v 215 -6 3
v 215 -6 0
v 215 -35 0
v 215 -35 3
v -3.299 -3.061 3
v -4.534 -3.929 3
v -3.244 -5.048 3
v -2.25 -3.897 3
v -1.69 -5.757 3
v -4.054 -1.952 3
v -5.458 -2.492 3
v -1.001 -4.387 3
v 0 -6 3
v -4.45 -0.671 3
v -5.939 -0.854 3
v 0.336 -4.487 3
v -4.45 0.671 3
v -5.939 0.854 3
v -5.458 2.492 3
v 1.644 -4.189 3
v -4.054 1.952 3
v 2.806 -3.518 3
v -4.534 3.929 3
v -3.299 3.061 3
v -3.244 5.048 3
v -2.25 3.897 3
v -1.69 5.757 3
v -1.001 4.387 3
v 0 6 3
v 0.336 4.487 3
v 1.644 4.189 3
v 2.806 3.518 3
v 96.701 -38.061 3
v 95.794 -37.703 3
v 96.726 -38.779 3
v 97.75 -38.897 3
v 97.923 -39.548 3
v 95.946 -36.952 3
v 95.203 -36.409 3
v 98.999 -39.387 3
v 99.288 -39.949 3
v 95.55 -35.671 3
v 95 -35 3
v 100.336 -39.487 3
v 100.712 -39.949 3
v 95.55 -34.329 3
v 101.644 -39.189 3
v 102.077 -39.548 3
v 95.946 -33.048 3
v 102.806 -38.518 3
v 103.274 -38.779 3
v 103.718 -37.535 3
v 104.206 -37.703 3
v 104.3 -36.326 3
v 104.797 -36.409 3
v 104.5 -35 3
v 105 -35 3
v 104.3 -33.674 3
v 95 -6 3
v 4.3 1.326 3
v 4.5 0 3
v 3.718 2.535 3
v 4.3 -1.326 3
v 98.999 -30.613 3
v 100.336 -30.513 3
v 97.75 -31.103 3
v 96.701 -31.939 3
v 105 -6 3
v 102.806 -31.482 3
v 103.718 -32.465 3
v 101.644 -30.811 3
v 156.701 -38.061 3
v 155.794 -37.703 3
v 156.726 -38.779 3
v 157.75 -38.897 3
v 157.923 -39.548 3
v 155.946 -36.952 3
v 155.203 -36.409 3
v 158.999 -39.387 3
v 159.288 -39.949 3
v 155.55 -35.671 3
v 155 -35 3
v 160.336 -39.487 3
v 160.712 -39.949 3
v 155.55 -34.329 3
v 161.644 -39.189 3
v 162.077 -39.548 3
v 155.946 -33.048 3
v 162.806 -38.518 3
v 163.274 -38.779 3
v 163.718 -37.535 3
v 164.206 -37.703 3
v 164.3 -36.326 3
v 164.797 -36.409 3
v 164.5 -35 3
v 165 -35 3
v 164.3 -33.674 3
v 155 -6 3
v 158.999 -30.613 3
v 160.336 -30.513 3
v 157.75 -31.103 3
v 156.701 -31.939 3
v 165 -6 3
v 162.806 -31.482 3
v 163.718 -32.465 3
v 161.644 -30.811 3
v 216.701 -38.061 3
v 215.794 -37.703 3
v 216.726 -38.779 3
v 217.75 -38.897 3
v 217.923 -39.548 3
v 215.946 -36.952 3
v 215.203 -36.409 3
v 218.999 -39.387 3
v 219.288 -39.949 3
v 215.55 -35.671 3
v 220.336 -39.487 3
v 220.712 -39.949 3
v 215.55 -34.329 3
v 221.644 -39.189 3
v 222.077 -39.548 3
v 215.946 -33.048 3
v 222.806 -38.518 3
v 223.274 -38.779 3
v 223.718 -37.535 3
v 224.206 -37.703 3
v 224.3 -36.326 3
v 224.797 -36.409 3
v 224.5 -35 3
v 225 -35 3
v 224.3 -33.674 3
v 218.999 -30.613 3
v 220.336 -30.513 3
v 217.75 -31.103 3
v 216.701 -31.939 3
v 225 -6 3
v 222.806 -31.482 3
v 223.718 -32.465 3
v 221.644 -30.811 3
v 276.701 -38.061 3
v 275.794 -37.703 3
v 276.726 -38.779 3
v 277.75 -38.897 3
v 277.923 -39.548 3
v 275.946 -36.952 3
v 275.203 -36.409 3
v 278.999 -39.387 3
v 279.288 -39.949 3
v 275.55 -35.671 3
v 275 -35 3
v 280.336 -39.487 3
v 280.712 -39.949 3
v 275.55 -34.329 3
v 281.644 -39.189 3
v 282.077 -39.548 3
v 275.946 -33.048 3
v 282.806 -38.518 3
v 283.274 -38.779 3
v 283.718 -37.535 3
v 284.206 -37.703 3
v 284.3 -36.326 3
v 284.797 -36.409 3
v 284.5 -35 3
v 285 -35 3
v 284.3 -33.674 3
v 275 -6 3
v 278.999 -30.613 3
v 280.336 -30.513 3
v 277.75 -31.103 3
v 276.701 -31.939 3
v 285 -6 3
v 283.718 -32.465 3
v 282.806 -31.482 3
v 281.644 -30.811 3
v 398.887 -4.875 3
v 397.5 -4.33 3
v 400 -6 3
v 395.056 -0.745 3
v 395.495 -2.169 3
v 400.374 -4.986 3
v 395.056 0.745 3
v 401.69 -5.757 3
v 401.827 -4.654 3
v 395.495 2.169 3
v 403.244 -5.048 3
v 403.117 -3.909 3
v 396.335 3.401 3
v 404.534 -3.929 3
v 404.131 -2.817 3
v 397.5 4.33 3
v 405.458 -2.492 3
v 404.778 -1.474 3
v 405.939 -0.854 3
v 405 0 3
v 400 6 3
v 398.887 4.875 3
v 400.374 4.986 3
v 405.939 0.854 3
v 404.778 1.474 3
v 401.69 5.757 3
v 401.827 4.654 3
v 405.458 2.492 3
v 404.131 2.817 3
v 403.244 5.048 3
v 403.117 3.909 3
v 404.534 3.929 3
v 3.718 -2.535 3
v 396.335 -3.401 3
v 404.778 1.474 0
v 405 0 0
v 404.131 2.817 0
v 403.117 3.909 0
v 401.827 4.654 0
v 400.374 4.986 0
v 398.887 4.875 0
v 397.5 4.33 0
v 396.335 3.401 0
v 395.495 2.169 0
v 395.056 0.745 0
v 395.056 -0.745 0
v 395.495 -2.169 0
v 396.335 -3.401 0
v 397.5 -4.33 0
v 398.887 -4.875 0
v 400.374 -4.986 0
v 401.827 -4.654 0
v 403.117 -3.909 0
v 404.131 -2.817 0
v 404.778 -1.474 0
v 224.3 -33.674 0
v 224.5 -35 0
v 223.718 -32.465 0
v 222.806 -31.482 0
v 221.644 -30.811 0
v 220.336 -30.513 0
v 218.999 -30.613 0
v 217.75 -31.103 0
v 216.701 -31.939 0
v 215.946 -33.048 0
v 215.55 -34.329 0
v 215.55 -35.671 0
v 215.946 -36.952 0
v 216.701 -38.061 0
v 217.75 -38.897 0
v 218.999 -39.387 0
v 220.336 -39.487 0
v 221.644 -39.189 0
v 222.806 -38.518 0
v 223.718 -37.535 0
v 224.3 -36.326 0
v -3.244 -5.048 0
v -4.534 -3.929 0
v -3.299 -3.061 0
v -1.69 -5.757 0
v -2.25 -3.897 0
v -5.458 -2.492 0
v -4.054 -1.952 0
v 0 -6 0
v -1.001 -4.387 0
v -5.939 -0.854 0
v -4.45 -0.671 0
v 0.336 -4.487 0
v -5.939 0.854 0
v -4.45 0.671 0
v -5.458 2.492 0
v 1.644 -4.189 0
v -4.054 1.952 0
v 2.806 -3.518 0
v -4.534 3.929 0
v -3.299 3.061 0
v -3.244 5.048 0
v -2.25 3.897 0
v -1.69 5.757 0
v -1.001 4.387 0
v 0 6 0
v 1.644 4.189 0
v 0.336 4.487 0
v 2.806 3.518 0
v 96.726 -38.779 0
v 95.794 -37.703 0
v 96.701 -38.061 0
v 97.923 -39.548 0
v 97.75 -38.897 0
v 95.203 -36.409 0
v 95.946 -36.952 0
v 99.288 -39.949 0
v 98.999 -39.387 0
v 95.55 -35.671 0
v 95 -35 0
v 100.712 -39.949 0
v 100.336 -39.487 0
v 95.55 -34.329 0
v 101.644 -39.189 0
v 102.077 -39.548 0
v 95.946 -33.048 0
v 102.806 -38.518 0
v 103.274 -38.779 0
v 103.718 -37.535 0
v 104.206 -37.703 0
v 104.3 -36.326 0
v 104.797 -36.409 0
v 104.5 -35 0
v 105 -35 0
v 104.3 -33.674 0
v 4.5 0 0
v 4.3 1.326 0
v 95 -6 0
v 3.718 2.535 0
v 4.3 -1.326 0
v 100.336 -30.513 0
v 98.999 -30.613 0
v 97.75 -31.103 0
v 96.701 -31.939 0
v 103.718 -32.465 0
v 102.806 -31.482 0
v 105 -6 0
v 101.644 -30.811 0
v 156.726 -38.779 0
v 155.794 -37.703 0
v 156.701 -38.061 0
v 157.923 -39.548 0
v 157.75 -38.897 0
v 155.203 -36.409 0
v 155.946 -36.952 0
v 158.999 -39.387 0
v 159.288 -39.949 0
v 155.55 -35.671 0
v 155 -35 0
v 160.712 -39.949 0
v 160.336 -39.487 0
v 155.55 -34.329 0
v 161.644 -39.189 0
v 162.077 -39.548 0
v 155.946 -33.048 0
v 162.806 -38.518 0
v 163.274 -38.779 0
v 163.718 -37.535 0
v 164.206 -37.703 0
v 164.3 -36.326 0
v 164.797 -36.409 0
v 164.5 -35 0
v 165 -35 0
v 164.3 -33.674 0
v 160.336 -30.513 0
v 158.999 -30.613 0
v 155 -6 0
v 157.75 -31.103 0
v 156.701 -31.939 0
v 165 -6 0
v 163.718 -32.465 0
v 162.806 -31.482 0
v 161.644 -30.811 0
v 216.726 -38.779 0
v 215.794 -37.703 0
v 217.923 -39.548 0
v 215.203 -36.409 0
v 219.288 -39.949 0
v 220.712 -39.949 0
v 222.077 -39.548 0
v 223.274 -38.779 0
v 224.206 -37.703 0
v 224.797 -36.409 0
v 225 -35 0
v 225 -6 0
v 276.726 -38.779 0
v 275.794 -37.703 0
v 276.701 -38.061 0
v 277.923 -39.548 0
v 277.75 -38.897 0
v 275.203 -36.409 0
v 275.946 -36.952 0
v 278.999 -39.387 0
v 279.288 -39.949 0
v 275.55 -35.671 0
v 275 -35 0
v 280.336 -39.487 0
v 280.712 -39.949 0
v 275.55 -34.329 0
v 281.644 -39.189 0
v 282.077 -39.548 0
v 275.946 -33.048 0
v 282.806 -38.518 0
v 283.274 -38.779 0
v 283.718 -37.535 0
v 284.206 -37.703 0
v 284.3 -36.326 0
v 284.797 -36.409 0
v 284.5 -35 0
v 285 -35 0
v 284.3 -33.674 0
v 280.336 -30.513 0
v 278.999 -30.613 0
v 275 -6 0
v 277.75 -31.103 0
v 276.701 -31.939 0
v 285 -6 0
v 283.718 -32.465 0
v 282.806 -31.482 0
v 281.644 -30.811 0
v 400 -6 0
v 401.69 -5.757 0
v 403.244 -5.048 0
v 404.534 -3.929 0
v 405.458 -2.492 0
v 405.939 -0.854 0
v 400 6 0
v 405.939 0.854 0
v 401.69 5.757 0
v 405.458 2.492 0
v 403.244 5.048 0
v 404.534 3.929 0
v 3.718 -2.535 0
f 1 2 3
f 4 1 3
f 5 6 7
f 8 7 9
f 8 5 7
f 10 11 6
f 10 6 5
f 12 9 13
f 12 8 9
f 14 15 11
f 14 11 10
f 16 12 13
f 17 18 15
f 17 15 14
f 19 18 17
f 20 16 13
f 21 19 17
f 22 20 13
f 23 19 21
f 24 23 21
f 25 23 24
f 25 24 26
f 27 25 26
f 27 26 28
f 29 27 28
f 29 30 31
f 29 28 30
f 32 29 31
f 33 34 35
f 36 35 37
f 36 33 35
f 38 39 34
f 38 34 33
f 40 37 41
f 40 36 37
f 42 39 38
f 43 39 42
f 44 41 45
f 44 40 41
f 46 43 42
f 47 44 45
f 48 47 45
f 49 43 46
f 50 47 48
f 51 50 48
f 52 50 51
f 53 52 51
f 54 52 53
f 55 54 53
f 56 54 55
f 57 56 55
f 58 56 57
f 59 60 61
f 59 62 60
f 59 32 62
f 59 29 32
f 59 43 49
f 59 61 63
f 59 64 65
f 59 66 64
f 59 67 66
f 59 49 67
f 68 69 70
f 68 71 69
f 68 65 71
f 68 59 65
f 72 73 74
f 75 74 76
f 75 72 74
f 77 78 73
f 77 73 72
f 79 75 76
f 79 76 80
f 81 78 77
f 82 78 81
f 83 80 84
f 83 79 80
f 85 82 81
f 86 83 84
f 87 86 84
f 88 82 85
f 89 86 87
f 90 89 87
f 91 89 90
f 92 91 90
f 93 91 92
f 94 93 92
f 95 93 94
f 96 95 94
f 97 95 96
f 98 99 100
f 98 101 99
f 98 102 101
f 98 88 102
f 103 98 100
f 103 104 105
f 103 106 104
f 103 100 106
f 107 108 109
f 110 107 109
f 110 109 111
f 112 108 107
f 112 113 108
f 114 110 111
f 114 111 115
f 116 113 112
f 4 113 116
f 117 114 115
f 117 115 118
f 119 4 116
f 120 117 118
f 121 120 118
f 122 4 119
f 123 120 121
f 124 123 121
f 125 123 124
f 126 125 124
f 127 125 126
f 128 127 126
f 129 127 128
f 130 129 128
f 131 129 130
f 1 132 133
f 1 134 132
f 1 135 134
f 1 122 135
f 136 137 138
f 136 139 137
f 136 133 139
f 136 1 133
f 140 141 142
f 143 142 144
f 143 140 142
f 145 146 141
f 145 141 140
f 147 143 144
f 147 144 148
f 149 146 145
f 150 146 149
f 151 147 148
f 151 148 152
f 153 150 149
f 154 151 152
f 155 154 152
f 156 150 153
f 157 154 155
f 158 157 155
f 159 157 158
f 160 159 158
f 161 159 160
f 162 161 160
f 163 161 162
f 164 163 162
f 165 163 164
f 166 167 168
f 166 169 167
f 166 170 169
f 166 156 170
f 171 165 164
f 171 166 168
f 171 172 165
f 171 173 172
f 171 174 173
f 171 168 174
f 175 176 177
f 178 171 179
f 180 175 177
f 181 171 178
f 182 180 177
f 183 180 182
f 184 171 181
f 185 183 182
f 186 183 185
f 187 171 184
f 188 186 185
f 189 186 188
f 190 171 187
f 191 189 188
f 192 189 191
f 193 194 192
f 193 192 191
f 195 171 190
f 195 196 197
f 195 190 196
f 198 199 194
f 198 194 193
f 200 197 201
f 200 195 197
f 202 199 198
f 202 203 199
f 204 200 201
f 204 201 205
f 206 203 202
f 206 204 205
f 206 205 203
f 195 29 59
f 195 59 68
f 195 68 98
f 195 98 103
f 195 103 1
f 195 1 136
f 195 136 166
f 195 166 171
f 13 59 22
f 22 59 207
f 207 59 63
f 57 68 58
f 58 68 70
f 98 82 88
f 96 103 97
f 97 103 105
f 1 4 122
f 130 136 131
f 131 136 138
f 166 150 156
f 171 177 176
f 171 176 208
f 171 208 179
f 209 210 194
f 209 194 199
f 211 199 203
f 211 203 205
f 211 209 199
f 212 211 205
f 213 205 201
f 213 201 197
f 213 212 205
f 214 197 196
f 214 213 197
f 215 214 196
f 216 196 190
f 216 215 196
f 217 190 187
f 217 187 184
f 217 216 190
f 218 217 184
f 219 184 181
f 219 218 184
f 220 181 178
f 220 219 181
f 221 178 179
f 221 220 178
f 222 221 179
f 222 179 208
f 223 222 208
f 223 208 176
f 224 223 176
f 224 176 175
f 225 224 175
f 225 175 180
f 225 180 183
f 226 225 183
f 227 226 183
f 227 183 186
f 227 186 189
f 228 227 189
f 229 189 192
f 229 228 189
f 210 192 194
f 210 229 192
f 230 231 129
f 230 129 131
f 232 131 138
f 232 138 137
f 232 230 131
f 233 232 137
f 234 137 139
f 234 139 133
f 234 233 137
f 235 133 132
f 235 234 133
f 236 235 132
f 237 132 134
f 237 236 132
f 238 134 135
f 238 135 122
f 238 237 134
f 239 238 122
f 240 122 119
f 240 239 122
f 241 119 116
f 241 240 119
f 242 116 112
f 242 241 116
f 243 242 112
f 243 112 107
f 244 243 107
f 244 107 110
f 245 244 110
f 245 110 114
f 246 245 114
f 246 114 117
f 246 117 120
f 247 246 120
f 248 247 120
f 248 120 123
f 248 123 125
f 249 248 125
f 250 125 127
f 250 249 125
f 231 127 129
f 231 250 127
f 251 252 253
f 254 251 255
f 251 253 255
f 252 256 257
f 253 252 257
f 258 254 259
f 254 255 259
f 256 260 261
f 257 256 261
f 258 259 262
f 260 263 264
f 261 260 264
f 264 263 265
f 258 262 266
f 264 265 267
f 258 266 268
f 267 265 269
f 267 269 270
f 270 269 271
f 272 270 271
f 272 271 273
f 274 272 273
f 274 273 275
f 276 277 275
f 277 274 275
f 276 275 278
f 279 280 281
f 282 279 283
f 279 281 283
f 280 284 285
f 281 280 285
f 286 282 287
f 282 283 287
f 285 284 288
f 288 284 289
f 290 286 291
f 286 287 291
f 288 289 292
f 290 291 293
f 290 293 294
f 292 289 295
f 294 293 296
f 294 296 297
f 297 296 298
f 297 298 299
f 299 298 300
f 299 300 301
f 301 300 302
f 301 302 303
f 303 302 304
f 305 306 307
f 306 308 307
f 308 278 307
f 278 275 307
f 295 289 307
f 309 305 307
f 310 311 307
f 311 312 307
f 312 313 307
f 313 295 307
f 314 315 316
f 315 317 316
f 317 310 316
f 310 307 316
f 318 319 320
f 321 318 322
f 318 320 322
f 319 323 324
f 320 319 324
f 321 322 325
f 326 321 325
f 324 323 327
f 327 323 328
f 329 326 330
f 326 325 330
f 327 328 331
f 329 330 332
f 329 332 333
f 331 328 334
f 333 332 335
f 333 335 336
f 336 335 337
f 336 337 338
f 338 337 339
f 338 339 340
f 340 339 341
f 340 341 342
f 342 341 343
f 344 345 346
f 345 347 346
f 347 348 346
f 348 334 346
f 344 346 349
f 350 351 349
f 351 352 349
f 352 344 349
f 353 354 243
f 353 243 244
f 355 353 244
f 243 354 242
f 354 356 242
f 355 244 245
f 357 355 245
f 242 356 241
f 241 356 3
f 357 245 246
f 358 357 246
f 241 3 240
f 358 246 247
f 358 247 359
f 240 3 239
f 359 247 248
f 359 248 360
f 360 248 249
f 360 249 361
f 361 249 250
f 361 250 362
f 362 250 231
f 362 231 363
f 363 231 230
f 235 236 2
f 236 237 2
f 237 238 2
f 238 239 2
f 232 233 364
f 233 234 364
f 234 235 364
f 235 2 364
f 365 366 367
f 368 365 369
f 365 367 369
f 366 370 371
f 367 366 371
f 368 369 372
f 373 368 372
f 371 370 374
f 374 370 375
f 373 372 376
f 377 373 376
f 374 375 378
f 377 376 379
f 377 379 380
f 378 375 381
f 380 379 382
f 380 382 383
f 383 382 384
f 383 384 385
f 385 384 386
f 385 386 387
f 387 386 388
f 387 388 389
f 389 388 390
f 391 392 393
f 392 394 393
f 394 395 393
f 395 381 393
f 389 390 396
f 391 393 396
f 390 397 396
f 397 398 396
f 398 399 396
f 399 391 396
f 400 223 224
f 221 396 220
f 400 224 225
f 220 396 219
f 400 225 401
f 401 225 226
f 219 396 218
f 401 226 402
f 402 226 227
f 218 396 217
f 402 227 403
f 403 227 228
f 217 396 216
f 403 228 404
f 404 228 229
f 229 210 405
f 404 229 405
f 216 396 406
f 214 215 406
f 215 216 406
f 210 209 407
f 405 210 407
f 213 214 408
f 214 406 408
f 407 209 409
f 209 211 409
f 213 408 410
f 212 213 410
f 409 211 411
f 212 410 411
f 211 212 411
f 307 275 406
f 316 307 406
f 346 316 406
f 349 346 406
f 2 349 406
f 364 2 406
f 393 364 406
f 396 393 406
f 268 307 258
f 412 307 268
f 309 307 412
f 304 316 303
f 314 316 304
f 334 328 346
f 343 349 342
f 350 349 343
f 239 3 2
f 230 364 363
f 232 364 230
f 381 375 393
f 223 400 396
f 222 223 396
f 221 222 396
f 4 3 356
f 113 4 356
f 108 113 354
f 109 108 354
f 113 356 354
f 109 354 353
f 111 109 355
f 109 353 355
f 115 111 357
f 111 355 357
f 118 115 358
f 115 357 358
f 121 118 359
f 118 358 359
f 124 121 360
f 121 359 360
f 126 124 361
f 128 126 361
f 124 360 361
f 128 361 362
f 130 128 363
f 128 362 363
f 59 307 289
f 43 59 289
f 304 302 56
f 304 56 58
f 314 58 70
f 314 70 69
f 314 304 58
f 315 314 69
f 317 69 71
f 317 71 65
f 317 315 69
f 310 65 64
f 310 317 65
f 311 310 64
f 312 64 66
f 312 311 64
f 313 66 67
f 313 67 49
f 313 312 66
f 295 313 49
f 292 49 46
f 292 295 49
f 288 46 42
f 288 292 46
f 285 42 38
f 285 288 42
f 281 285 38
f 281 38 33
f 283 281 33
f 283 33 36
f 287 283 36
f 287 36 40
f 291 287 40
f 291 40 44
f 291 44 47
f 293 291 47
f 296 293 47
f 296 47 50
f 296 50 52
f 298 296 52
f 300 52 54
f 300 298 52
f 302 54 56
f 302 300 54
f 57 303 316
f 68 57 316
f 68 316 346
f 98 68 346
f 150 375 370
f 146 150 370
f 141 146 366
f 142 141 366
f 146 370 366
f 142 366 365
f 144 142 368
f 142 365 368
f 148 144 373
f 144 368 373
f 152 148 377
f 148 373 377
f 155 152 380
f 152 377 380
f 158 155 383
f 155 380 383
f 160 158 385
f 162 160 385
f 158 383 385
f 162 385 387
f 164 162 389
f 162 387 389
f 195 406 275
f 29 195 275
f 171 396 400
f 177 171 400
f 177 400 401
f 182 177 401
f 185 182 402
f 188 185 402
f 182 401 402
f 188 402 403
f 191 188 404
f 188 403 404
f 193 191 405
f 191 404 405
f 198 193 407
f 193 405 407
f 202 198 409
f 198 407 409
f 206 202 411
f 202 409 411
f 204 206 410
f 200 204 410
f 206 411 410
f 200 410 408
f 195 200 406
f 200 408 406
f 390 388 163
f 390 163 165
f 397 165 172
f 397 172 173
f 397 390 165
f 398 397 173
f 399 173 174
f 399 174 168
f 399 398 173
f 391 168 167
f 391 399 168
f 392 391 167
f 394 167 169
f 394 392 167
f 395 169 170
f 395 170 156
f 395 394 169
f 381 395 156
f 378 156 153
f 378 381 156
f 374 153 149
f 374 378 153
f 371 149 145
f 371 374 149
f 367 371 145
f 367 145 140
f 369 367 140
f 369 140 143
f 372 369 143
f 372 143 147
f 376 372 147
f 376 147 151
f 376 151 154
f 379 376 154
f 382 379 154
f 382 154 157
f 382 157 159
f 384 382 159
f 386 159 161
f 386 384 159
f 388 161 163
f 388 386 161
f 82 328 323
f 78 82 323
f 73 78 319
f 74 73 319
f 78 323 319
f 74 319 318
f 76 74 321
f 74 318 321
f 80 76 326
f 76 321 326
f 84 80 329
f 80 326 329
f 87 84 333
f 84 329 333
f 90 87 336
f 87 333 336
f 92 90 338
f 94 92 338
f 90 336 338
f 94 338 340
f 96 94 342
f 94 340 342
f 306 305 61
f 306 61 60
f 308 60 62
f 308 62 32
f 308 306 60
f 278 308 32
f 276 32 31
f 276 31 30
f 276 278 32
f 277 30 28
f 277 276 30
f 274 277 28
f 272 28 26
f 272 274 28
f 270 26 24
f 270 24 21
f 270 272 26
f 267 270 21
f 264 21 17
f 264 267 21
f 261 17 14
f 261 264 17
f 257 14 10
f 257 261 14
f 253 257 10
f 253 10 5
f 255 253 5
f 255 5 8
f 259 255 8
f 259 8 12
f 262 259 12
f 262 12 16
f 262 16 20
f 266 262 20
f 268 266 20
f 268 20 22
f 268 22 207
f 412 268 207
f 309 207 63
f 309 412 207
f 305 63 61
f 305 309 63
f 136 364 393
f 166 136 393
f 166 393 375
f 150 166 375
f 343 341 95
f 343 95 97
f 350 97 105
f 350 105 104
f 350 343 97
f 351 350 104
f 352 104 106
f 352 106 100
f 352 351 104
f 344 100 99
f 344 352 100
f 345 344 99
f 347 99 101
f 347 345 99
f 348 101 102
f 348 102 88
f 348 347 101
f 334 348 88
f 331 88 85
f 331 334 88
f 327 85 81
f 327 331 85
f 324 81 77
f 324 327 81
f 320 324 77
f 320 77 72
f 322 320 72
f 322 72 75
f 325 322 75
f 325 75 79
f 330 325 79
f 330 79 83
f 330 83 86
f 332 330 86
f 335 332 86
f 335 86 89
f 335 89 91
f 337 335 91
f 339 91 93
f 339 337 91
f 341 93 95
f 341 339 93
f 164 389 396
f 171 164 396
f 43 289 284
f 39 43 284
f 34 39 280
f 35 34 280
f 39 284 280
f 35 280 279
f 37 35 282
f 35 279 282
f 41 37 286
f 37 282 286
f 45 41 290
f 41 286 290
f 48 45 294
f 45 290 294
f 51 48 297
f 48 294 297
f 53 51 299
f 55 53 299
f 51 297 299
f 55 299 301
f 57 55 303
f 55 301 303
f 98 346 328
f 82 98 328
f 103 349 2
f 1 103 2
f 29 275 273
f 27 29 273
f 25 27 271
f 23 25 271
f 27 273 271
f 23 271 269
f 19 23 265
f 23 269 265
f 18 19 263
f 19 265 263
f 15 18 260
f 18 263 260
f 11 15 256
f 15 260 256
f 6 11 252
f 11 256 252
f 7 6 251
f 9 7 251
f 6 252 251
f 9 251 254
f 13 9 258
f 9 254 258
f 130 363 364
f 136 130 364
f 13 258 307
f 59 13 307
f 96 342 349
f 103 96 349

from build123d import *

# Parameters (mm, degrees)
SKETCH1_R           = 4.5
SKETCH1_R_2         = 5
BOSS_EXTRUDE2_DEPTH = 3


with BuildPart() as part:
    # Sketch1 → Boss-Extrude2 (new body)
    with BuildSketch(Plane.XY):
        with BuildLine():
            Line((400, 6), (0, 6))
            ThreePointArc((0, 6), (-6, 0), (0, -6))
            Line((0, -6), (95, -6))
            Line((95, -6), (95, -35))
            ThreePointArc((95, -35), (100, -40), (105, -35))
            Line((105, -35), (105, -6))
            Line((105, -6), (155, -6))
            Line((155, -6), (155, -35))
            ThreePointArc((155, -35), (160, -40), (165, -35))
            Line((165, -35), (165, -6))
            Line((165, -6), (215, -6))
            Line((215, -6), (215, -35))
            ThreePointArc((215, -35), (220, -40), (225, -35))
            Line((225, -35), (225, -6))
            Line((225, -6), (275, -6))
            Line((275, -6), (275, -35))
            ThreePointArc((275, -35), (280, -40), (285, -35))
            Line((285, -35), (285, -6))
            Line((285, -6), (400, -6))
            ThreePointArc((400, -6), (406, 0), (400, 6))
        make_face()
        Circle(SKETCH1_R, mode=Mode.SUBTRACT)
        with Locations((400, 0)):
            Circle(SKETCH1_R_2, mode=Mode.SUBTRACT)
        with Locations((100, -35)):
            Circle(SKETCH1_R, mode=Mode.SUBTRACT)
        with Locations((280, -35)):
            Circle(SKETCH1_R, mode=Mode.SUBTRACT)
        with Locations((160, -35)):
            Circle(SKETCH1_R, mode=Mode.SUBTRACT)
        with Locations((220, -35)):
            Circle(SKETCH1_R, mode=Mode.SUBTRACT)
    extrude(amount=BOSS_EXTRUDE2_DEPTH)


solid = part.part
